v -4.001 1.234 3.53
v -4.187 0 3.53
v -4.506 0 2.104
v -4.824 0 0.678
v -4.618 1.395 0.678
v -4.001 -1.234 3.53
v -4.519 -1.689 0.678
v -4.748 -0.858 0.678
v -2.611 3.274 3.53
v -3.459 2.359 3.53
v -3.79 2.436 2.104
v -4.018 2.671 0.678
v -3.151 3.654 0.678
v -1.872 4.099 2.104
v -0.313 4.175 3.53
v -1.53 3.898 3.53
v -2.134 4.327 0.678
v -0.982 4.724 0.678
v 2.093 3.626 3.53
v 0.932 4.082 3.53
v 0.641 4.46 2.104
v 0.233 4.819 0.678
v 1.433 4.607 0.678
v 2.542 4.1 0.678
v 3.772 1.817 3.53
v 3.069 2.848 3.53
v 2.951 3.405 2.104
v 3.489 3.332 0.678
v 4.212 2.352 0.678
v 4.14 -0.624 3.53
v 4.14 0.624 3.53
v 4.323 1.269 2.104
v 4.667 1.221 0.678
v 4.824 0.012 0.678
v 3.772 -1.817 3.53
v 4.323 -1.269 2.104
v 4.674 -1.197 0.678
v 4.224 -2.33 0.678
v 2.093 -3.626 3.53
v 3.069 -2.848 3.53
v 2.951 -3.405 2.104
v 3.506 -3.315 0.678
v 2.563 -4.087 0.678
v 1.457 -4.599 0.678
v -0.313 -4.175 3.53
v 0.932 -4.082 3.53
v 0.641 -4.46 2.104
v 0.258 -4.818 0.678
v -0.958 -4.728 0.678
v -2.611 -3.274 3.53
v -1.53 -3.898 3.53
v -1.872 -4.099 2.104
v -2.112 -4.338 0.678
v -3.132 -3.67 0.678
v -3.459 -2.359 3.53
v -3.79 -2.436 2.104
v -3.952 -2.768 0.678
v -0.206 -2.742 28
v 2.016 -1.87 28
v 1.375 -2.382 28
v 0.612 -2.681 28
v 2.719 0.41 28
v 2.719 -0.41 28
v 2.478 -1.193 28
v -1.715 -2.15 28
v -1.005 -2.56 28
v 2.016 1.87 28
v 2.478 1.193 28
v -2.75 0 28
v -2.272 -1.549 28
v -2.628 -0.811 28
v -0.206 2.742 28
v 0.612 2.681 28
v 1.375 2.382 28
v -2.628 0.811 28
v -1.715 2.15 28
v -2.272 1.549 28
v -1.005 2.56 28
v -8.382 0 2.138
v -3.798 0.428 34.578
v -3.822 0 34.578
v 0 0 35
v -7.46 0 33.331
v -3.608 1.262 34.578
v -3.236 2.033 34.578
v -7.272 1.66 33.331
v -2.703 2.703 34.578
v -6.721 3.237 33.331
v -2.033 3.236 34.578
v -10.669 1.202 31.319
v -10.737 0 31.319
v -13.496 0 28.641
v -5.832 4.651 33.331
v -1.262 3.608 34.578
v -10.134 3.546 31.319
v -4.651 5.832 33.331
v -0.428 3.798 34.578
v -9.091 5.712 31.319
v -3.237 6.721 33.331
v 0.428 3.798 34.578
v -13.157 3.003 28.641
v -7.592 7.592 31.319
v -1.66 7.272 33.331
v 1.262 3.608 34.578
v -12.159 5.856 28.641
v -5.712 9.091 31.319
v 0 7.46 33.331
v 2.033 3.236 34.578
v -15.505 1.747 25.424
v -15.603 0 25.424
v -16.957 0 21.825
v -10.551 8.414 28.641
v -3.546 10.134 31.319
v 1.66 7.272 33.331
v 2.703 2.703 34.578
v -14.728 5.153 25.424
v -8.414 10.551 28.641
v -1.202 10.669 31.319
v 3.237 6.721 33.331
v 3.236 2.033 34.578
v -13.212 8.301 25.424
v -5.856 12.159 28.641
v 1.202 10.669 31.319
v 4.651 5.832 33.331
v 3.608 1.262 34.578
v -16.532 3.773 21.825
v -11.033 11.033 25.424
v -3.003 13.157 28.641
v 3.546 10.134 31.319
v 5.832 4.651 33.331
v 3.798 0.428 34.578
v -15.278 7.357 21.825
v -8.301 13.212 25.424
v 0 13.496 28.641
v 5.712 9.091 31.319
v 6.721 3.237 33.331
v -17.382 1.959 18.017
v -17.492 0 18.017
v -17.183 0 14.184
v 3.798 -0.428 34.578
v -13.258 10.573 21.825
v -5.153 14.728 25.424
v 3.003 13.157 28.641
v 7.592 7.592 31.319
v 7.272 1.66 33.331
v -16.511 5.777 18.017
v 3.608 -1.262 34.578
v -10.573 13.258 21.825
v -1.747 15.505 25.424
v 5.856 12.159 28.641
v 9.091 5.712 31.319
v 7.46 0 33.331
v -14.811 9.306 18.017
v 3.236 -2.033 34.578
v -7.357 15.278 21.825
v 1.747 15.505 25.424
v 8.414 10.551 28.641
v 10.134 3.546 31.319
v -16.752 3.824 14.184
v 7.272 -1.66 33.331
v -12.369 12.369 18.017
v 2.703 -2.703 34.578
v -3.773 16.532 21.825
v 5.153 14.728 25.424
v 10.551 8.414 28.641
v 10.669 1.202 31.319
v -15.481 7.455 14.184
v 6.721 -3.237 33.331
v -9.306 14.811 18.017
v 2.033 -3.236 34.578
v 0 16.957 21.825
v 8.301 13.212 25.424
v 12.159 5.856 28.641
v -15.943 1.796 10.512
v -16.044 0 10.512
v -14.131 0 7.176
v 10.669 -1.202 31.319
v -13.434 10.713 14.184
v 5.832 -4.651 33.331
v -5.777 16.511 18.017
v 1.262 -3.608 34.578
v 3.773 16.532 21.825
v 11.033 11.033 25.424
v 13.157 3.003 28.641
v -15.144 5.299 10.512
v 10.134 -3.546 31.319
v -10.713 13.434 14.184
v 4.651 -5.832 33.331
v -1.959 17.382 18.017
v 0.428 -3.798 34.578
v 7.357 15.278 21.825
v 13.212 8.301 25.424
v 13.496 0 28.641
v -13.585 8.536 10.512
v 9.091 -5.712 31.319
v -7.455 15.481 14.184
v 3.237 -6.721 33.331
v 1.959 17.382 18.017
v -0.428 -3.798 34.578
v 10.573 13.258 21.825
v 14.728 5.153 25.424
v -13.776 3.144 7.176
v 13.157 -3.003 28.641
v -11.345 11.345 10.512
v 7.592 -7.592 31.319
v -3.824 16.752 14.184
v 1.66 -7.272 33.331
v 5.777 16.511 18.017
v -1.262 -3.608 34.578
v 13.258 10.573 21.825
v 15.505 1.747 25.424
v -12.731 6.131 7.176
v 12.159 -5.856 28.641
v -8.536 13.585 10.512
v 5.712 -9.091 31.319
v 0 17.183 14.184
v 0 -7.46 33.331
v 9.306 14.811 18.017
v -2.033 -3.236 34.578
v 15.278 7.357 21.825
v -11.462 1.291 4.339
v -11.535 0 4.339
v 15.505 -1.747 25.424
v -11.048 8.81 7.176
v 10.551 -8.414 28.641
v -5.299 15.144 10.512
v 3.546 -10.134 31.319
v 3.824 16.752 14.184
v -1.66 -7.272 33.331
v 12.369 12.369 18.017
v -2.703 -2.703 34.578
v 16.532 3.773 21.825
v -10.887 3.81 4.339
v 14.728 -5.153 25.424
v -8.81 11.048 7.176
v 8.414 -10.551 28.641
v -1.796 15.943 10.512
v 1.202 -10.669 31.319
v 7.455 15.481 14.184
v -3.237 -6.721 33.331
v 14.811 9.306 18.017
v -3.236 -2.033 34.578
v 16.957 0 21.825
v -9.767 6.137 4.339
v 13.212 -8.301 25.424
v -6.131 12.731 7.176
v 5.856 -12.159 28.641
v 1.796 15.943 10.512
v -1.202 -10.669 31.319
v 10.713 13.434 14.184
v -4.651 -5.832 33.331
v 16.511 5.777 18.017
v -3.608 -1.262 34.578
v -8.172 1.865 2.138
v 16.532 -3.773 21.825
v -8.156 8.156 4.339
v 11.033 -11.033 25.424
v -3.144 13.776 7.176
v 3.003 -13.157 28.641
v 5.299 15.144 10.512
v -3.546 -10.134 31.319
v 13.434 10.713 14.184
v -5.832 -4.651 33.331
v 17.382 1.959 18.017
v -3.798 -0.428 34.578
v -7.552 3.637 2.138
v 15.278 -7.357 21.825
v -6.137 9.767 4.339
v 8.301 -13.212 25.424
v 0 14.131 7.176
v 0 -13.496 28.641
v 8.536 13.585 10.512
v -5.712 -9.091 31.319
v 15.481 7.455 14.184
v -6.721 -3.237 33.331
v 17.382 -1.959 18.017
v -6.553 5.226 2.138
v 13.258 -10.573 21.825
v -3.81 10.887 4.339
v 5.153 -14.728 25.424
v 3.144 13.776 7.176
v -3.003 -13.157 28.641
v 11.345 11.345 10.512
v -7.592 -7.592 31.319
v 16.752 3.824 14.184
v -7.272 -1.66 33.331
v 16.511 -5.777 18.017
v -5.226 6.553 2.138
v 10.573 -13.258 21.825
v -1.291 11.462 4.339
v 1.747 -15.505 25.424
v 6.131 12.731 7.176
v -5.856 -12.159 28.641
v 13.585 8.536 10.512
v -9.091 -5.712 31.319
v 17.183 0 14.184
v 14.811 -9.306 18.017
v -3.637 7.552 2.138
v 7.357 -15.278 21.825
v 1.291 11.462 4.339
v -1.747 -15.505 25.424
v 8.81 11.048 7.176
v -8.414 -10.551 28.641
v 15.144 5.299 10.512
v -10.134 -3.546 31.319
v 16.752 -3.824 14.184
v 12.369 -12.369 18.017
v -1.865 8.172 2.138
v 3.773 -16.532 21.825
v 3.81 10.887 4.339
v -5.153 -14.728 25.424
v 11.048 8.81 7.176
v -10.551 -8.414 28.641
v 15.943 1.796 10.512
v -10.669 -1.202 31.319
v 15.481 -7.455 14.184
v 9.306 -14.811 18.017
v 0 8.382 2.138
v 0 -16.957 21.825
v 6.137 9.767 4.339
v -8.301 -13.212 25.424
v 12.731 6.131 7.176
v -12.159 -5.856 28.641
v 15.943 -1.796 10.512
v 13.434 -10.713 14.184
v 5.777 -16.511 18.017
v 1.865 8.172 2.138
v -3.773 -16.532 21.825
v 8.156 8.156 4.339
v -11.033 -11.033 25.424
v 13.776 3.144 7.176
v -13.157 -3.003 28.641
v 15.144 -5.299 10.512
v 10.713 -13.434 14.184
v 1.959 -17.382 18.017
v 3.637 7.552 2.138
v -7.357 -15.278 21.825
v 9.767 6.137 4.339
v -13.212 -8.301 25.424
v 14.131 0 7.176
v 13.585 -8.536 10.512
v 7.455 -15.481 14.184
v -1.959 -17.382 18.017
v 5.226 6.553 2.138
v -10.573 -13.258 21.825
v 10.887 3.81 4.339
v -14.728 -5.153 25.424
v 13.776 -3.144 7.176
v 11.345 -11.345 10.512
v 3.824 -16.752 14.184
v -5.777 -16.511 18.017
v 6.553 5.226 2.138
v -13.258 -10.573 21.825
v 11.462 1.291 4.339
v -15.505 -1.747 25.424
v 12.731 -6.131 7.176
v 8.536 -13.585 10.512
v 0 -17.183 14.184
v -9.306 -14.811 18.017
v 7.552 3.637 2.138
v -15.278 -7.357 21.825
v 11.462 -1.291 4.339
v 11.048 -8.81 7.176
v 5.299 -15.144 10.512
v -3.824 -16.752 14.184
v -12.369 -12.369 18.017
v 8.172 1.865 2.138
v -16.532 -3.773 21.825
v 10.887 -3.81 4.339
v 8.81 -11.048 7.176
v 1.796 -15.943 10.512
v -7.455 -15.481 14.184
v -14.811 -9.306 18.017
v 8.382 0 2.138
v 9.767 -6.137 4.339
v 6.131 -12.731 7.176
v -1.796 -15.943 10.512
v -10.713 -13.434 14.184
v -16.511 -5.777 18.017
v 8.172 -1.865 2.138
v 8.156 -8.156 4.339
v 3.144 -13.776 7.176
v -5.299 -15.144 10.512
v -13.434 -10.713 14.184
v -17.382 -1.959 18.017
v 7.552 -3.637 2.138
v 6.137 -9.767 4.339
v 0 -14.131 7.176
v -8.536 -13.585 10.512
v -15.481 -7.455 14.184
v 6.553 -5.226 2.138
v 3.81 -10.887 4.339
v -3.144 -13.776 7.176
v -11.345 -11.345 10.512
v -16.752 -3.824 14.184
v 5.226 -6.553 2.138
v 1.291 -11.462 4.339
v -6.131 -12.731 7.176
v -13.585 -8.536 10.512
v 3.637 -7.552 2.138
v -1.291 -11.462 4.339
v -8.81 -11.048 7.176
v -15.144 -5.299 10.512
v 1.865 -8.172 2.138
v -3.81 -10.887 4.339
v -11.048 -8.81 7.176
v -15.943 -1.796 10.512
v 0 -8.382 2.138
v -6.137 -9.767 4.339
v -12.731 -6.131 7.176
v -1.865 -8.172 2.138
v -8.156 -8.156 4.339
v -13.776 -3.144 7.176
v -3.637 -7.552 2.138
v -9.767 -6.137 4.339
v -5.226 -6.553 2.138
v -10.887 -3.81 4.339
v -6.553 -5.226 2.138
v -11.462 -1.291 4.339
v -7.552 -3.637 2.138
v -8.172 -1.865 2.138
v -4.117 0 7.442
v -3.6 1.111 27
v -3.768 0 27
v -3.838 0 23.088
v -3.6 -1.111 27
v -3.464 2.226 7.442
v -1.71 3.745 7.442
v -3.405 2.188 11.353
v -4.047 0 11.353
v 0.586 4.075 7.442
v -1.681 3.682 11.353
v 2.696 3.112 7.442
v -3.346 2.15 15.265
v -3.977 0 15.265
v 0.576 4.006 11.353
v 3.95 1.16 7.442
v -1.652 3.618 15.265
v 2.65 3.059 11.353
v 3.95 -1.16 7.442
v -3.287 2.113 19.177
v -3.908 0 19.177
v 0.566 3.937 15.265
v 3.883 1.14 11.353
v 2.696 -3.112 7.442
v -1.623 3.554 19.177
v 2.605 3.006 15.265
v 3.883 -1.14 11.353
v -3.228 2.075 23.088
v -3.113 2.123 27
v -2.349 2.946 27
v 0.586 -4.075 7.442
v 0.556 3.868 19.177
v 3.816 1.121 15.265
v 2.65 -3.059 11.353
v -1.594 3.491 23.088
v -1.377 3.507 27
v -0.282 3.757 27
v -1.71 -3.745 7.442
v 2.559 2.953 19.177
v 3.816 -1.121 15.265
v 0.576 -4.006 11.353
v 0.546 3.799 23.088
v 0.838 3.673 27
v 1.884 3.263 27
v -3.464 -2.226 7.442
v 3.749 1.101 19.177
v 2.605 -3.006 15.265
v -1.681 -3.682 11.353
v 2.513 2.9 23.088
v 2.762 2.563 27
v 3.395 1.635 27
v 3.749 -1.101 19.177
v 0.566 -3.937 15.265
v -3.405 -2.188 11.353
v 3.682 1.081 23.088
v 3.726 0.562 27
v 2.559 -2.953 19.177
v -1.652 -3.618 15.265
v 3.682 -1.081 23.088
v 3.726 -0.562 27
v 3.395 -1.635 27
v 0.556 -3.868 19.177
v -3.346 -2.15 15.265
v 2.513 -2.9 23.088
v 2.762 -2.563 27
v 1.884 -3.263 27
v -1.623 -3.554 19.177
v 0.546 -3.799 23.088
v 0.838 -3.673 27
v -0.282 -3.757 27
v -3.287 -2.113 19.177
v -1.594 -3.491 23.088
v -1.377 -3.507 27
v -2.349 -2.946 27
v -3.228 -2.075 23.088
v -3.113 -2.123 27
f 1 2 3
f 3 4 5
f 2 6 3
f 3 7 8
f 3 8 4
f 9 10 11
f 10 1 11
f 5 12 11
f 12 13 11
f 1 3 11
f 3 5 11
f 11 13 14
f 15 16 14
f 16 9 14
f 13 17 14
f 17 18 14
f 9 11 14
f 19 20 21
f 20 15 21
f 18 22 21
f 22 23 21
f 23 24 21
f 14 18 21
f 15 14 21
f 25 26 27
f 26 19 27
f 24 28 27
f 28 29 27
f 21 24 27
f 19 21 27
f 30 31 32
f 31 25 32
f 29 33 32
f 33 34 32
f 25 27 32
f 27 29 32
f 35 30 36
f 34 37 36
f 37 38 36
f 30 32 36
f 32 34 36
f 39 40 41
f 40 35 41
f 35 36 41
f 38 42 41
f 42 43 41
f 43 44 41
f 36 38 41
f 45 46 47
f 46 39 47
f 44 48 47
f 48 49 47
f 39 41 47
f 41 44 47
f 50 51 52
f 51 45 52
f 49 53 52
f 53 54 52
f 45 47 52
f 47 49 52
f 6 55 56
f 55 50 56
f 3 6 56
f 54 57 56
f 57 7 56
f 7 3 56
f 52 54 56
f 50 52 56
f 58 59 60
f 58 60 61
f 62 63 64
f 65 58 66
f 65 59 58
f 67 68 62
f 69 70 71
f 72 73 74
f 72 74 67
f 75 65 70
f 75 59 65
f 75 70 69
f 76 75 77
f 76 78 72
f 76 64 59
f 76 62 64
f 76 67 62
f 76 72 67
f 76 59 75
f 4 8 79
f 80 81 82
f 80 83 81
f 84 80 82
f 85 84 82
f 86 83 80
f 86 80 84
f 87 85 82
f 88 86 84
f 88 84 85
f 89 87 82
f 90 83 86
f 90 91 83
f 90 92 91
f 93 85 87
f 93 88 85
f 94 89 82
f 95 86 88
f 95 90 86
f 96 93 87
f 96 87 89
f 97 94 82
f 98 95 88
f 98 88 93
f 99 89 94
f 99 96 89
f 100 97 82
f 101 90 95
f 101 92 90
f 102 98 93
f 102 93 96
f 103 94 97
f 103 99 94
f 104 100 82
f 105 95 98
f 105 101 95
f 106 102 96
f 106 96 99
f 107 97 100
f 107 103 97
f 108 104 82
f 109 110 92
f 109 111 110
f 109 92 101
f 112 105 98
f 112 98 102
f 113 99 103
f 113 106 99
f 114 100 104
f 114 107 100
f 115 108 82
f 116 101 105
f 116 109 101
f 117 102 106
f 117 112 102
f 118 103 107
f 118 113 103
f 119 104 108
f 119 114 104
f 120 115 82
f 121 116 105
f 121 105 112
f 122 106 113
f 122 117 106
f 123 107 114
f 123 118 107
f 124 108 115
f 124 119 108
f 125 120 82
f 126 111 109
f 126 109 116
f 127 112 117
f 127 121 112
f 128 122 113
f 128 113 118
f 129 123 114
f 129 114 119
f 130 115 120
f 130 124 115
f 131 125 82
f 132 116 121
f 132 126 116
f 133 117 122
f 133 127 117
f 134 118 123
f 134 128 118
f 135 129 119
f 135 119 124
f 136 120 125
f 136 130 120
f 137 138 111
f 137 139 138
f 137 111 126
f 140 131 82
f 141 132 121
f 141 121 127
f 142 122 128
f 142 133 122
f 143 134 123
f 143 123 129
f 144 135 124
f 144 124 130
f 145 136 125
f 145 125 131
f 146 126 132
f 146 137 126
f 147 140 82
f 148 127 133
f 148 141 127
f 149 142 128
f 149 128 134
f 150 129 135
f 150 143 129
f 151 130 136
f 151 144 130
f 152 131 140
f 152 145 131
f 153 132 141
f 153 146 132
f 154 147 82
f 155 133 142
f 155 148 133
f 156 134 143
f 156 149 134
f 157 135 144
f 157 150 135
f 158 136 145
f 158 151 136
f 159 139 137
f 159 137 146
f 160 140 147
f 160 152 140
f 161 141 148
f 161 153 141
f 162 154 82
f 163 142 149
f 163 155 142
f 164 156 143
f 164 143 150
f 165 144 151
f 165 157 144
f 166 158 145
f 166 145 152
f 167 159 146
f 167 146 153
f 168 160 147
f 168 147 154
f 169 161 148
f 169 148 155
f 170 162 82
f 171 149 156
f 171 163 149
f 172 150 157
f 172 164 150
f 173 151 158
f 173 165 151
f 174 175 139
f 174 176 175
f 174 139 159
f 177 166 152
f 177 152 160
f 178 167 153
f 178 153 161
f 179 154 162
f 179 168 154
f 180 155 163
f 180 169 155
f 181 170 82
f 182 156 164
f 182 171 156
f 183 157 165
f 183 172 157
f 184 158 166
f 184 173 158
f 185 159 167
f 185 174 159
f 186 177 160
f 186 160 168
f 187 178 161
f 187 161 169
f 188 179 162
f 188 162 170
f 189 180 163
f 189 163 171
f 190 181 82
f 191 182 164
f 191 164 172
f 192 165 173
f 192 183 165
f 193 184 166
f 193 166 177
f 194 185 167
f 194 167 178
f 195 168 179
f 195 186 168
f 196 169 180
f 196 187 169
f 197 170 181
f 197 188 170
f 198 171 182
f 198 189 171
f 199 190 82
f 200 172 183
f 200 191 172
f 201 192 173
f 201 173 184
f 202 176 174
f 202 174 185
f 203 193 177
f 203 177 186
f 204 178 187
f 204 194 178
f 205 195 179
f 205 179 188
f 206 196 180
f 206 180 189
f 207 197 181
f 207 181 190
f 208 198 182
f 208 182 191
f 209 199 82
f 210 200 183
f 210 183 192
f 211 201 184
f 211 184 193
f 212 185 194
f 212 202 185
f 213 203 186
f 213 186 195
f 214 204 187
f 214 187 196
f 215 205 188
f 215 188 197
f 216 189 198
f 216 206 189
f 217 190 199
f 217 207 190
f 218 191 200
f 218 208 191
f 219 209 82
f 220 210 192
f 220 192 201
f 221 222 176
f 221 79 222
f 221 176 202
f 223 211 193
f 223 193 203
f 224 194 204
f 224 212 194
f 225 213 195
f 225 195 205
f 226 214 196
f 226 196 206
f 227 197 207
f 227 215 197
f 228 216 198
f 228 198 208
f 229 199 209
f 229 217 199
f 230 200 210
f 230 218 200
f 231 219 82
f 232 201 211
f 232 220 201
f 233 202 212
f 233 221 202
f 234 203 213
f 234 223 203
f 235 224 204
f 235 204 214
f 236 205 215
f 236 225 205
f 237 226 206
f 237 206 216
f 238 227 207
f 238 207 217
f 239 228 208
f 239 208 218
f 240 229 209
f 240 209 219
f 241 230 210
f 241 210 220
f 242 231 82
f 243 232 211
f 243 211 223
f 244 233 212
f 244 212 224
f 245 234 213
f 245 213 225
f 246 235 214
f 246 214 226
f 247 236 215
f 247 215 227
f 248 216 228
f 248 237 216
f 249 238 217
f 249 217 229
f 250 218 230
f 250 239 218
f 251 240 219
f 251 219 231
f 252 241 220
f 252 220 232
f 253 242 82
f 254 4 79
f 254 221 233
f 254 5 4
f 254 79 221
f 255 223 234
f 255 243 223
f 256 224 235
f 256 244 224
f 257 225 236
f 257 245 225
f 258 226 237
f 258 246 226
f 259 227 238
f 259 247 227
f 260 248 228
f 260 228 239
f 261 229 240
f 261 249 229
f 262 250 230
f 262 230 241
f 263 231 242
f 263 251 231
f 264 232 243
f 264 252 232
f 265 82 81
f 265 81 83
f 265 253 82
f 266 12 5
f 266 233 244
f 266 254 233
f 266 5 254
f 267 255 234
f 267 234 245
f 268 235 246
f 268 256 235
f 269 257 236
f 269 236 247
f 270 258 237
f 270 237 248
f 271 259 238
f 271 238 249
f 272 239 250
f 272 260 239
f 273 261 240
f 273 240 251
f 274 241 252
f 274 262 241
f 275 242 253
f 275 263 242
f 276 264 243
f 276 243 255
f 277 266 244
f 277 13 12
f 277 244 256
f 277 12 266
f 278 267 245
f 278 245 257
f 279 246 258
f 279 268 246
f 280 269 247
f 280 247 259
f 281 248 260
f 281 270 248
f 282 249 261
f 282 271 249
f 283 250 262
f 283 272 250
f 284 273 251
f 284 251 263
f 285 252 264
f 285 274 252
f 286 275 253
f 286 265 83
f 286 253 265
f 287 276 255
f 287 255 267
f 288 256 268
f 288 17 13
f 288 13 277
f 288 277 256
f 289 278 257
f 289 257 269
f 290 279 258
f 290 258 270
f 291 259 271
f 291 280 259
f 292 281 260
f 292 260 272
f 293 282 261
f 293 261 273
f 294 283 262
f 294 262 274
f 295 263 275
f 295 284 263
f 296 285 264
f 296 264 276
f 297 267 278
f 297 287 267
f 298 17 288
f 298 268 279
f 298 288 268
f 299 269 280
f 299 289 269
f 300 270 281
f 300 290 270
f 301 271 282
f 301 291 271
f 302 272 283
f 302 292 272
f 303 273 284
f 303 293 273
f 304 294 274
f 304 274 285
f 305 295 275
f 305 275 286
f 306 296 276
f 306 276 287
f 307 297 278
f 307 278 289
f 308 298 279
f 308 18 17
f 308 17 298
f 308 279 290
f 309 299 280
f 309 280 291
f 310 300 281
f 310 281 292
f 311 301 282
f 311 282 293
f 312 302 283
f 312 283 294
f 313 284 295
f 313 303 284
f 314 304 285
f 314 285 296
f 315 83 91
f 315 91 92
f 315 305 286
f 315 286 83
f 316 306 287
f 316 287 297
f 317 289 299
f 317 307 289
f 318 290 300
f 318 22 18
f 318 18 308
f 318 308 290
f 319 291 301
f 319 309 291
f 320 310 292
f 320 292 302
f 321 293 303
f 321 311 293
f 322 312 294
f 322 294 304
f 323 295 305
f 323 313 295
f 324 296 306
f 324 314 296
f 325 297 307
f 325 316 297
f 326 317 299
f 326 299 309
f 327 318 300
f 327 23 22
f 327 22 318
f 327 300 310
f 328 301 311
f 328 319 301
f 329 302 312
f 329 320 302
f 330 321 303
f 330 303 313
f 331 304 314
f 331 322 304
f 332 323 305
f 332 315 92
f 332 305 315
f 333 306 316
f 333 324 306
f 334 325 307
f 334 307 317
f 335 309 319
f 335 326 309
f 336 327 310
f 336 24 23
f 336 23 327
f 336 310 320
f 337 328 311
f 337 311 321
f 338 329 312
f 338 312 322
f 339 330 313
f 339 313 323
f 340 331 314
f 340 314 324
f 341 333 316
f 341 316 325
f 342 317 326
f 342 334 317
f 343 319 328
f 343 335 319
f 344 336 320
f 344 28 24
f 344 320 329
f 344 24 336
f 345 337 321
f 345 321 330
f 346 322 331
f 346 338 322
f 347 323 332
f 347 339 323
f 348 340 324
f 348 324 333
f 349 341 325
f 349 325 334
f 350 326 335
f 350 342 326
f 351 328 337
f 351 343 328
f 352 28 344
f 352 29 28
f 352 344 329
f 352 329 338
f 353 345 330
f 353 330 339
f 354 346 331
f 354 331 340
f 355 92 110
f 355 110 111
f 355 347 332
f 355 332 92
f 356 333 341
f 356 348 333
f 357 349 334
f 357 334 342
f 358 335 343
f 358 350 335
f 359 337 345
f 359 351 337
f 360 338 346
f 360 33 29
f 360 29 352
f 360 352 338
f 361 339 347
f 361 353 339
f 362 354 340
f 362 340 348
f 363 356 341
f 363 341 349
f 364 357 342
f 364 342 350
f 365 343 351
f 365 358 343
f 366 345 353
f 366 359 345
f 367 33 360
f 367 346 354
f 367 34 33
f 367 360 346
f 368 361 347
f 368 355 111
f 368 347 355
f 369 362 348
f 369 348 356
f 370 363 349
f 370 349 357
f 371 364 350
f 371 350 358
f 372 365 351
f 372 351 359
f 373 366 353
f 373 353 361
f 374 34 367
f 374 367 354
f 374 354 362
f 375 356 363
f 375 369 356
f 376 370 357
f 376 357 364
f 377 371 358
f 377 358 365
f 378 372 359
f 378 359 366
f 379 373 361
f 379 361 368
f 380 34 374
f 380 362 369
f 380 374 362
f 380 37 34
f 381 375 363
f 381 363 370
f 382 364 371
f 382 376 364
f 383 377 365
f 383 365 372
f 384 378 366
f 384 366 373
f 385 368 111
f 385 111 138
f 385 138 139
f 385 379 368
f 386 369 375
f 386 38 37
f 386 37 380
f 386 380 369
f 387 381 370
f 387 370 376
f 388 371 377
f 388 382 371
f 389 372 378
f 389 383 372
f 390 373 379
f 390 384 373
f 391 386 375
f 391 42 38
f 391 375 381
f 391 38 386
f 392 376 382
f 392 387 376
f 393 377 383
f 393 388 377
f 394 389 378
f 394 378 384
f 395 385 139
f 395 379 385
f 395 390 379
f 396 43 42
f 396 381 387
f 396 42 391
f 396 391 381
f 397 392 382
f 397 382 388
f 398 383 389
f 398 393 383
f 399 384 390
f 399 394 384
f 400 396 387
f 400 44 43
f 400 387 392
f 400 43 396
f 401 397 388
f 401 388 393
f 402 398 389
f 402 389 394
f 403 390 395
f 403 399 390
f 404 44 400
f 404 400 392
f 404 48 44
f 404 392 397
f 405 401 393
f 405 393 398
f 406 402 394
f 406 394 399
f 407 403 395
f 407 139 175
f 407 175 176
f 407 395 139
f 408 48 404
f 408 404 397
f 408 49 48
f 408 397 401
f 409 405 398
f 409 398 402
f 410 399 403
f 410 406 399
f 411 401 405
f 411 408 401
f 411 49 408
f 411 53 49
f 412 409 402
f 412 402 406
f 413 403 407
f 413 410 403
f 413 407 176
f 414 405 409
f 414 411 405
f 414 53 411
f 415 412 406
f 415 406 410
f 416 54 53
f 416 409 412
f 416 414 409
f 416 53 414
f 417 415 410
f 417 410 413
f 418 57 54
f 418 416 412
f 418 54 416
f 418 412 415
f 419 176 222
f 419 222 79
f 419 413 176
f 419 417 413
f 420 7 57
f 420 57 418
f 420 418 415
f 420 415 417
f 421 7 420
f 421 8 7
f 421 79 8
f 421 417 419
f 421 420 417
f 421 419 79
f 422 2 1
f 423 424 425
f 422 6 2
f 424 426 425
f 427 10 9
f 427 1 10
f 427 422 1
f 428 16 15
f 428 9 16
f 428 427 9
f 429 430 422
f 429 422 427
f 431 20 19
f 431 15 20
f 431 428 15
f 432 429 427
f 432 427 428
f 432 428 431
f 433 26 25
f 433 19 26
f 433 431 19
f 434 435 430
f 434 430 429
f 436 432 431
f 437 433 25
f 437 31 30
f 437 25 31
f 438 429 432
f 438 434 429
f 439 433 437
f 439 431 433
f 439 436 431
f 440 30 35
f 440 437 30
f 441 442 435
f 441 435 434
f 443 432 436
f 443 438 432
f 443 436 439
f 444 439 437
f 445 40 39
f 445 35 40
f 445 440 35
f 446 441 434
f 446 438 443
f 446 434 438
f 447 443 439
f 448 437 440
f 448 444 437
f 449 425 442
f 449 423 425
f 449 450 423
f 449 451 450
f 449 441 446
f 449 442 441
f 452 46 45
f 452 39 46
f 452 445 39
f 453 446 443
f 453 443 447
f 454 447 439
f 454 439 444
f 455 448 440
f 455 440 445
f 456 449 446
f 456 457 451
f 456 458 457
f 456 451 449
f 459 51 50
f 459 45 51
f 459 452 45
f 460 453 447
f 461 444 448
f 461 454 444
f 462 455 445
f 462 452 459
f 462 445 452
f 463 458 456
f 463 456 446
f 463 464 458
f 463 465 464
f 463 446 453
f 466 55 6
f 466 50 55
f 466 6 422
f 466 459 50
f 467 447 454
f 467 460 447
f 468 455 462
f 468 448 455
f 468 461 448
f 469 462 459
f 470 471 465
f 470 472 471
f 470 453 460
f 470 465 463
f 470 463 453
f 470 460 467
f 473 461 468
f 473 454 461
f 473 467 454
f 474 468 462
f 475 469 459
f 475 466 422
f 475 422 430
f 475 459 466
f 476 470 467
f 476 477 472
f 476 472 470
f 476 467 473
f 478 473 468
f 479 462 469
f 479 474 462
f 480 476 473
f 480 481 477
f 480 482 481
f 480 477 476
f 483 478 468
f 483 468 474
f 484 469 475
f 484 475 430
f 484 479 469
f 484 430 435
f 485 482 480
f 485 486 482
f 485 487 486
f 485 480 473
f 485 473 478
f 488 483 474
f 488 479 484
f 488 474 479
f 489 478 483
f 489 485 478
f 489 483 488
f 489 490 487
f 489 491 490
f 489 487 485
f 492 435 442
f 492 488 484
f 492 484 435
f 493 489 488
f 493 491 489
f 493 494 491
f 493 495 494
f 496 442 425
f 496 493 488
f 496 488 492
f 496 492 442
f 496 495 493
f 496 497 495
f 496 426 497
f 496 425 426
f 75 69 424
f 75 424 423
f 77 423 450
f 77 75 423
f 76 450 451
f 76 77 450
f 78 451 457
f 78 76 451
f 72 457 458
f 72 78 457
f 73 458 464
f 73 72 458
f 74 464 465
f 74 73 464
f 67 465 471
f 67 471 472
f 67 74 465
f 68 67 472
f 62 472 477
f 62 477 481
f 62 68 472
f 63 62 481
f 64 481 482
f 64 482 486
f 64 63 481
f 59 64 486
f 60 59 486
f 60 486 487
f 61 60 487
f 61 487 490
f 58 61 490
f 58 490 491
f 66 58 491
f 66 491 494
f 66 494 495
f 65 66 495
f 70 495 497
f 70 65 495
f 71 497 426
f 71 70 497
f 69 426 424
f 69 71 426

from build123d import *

# Parameters (mm, degrees)
F4_SIZE = 1


# Not quite as in the source:
# - a fillet or chamfer that OpenCascade refuses, or shapes differently, is made with other operations: its cross-section is extruded or revolved along the edge and cut away or added


with BuildPart() as f1:
    # F0 (on Front) → F1 (revolve)
    with BuildSketch(Plane.XZ):
        with BuildLine():
            Line((0, 28), (0, 35))
            ThreePointArc((0, 35), (-17.3691143388, 19.6363209229), (-4.2406859855, 0.5215848098))
            Line((-4.2406859855, 0.5215848098), (-3.75, 28))
            Line((-3.75, 28), (0, 28))
        make_face()
    revolve(axis=Axis((0, 0, 16.7157072574), (0, 0, -1)))

    # F2: chamfer of 0.5 x 3 on 1 edges, made by hand

    # F2_s1 → F2_t2 (revolve, cut)
    with BuildSketch(Plane.XZ):
        with BuildLine():
            Line((-4.1607847025, 3.6471133949), (-4.8506659959, 0.5610496404))
            Line((-4.8506659959, 0.5610496404), (-4.8672070924, 0.5033747574))
            ThreePointArc((-4.8672070924, 0.5033747574), (-4.5463653864, 0.5387452771), (-4.2552254803, 0.4633731005))
            Line((-4.2552254803, 0.4633731005), (-4.1806955496, 0.520513552))
            ThreePointArc((-4.1806955496, 0.520513552), (-4.152785205, 2.0834928499), (-4.1007942666, 3.6460421371))
            Line((-4.1007942666, 3.6460421371), (-4.1607847025, 3.6471133949))
        make_face()
    revolve(axis=Axis((0, 0, 0.5215848098), (0, 0, -1)), mode=Mode.SUBTRACT)

    # F4
    f4_edges = [f1.edges().sort_by_distance(p)[0] for p in [
        (3.75, 0, 28),
    ]]
    chamfer(f4_edges, length=F4_SIZE)


solid = f1.part
